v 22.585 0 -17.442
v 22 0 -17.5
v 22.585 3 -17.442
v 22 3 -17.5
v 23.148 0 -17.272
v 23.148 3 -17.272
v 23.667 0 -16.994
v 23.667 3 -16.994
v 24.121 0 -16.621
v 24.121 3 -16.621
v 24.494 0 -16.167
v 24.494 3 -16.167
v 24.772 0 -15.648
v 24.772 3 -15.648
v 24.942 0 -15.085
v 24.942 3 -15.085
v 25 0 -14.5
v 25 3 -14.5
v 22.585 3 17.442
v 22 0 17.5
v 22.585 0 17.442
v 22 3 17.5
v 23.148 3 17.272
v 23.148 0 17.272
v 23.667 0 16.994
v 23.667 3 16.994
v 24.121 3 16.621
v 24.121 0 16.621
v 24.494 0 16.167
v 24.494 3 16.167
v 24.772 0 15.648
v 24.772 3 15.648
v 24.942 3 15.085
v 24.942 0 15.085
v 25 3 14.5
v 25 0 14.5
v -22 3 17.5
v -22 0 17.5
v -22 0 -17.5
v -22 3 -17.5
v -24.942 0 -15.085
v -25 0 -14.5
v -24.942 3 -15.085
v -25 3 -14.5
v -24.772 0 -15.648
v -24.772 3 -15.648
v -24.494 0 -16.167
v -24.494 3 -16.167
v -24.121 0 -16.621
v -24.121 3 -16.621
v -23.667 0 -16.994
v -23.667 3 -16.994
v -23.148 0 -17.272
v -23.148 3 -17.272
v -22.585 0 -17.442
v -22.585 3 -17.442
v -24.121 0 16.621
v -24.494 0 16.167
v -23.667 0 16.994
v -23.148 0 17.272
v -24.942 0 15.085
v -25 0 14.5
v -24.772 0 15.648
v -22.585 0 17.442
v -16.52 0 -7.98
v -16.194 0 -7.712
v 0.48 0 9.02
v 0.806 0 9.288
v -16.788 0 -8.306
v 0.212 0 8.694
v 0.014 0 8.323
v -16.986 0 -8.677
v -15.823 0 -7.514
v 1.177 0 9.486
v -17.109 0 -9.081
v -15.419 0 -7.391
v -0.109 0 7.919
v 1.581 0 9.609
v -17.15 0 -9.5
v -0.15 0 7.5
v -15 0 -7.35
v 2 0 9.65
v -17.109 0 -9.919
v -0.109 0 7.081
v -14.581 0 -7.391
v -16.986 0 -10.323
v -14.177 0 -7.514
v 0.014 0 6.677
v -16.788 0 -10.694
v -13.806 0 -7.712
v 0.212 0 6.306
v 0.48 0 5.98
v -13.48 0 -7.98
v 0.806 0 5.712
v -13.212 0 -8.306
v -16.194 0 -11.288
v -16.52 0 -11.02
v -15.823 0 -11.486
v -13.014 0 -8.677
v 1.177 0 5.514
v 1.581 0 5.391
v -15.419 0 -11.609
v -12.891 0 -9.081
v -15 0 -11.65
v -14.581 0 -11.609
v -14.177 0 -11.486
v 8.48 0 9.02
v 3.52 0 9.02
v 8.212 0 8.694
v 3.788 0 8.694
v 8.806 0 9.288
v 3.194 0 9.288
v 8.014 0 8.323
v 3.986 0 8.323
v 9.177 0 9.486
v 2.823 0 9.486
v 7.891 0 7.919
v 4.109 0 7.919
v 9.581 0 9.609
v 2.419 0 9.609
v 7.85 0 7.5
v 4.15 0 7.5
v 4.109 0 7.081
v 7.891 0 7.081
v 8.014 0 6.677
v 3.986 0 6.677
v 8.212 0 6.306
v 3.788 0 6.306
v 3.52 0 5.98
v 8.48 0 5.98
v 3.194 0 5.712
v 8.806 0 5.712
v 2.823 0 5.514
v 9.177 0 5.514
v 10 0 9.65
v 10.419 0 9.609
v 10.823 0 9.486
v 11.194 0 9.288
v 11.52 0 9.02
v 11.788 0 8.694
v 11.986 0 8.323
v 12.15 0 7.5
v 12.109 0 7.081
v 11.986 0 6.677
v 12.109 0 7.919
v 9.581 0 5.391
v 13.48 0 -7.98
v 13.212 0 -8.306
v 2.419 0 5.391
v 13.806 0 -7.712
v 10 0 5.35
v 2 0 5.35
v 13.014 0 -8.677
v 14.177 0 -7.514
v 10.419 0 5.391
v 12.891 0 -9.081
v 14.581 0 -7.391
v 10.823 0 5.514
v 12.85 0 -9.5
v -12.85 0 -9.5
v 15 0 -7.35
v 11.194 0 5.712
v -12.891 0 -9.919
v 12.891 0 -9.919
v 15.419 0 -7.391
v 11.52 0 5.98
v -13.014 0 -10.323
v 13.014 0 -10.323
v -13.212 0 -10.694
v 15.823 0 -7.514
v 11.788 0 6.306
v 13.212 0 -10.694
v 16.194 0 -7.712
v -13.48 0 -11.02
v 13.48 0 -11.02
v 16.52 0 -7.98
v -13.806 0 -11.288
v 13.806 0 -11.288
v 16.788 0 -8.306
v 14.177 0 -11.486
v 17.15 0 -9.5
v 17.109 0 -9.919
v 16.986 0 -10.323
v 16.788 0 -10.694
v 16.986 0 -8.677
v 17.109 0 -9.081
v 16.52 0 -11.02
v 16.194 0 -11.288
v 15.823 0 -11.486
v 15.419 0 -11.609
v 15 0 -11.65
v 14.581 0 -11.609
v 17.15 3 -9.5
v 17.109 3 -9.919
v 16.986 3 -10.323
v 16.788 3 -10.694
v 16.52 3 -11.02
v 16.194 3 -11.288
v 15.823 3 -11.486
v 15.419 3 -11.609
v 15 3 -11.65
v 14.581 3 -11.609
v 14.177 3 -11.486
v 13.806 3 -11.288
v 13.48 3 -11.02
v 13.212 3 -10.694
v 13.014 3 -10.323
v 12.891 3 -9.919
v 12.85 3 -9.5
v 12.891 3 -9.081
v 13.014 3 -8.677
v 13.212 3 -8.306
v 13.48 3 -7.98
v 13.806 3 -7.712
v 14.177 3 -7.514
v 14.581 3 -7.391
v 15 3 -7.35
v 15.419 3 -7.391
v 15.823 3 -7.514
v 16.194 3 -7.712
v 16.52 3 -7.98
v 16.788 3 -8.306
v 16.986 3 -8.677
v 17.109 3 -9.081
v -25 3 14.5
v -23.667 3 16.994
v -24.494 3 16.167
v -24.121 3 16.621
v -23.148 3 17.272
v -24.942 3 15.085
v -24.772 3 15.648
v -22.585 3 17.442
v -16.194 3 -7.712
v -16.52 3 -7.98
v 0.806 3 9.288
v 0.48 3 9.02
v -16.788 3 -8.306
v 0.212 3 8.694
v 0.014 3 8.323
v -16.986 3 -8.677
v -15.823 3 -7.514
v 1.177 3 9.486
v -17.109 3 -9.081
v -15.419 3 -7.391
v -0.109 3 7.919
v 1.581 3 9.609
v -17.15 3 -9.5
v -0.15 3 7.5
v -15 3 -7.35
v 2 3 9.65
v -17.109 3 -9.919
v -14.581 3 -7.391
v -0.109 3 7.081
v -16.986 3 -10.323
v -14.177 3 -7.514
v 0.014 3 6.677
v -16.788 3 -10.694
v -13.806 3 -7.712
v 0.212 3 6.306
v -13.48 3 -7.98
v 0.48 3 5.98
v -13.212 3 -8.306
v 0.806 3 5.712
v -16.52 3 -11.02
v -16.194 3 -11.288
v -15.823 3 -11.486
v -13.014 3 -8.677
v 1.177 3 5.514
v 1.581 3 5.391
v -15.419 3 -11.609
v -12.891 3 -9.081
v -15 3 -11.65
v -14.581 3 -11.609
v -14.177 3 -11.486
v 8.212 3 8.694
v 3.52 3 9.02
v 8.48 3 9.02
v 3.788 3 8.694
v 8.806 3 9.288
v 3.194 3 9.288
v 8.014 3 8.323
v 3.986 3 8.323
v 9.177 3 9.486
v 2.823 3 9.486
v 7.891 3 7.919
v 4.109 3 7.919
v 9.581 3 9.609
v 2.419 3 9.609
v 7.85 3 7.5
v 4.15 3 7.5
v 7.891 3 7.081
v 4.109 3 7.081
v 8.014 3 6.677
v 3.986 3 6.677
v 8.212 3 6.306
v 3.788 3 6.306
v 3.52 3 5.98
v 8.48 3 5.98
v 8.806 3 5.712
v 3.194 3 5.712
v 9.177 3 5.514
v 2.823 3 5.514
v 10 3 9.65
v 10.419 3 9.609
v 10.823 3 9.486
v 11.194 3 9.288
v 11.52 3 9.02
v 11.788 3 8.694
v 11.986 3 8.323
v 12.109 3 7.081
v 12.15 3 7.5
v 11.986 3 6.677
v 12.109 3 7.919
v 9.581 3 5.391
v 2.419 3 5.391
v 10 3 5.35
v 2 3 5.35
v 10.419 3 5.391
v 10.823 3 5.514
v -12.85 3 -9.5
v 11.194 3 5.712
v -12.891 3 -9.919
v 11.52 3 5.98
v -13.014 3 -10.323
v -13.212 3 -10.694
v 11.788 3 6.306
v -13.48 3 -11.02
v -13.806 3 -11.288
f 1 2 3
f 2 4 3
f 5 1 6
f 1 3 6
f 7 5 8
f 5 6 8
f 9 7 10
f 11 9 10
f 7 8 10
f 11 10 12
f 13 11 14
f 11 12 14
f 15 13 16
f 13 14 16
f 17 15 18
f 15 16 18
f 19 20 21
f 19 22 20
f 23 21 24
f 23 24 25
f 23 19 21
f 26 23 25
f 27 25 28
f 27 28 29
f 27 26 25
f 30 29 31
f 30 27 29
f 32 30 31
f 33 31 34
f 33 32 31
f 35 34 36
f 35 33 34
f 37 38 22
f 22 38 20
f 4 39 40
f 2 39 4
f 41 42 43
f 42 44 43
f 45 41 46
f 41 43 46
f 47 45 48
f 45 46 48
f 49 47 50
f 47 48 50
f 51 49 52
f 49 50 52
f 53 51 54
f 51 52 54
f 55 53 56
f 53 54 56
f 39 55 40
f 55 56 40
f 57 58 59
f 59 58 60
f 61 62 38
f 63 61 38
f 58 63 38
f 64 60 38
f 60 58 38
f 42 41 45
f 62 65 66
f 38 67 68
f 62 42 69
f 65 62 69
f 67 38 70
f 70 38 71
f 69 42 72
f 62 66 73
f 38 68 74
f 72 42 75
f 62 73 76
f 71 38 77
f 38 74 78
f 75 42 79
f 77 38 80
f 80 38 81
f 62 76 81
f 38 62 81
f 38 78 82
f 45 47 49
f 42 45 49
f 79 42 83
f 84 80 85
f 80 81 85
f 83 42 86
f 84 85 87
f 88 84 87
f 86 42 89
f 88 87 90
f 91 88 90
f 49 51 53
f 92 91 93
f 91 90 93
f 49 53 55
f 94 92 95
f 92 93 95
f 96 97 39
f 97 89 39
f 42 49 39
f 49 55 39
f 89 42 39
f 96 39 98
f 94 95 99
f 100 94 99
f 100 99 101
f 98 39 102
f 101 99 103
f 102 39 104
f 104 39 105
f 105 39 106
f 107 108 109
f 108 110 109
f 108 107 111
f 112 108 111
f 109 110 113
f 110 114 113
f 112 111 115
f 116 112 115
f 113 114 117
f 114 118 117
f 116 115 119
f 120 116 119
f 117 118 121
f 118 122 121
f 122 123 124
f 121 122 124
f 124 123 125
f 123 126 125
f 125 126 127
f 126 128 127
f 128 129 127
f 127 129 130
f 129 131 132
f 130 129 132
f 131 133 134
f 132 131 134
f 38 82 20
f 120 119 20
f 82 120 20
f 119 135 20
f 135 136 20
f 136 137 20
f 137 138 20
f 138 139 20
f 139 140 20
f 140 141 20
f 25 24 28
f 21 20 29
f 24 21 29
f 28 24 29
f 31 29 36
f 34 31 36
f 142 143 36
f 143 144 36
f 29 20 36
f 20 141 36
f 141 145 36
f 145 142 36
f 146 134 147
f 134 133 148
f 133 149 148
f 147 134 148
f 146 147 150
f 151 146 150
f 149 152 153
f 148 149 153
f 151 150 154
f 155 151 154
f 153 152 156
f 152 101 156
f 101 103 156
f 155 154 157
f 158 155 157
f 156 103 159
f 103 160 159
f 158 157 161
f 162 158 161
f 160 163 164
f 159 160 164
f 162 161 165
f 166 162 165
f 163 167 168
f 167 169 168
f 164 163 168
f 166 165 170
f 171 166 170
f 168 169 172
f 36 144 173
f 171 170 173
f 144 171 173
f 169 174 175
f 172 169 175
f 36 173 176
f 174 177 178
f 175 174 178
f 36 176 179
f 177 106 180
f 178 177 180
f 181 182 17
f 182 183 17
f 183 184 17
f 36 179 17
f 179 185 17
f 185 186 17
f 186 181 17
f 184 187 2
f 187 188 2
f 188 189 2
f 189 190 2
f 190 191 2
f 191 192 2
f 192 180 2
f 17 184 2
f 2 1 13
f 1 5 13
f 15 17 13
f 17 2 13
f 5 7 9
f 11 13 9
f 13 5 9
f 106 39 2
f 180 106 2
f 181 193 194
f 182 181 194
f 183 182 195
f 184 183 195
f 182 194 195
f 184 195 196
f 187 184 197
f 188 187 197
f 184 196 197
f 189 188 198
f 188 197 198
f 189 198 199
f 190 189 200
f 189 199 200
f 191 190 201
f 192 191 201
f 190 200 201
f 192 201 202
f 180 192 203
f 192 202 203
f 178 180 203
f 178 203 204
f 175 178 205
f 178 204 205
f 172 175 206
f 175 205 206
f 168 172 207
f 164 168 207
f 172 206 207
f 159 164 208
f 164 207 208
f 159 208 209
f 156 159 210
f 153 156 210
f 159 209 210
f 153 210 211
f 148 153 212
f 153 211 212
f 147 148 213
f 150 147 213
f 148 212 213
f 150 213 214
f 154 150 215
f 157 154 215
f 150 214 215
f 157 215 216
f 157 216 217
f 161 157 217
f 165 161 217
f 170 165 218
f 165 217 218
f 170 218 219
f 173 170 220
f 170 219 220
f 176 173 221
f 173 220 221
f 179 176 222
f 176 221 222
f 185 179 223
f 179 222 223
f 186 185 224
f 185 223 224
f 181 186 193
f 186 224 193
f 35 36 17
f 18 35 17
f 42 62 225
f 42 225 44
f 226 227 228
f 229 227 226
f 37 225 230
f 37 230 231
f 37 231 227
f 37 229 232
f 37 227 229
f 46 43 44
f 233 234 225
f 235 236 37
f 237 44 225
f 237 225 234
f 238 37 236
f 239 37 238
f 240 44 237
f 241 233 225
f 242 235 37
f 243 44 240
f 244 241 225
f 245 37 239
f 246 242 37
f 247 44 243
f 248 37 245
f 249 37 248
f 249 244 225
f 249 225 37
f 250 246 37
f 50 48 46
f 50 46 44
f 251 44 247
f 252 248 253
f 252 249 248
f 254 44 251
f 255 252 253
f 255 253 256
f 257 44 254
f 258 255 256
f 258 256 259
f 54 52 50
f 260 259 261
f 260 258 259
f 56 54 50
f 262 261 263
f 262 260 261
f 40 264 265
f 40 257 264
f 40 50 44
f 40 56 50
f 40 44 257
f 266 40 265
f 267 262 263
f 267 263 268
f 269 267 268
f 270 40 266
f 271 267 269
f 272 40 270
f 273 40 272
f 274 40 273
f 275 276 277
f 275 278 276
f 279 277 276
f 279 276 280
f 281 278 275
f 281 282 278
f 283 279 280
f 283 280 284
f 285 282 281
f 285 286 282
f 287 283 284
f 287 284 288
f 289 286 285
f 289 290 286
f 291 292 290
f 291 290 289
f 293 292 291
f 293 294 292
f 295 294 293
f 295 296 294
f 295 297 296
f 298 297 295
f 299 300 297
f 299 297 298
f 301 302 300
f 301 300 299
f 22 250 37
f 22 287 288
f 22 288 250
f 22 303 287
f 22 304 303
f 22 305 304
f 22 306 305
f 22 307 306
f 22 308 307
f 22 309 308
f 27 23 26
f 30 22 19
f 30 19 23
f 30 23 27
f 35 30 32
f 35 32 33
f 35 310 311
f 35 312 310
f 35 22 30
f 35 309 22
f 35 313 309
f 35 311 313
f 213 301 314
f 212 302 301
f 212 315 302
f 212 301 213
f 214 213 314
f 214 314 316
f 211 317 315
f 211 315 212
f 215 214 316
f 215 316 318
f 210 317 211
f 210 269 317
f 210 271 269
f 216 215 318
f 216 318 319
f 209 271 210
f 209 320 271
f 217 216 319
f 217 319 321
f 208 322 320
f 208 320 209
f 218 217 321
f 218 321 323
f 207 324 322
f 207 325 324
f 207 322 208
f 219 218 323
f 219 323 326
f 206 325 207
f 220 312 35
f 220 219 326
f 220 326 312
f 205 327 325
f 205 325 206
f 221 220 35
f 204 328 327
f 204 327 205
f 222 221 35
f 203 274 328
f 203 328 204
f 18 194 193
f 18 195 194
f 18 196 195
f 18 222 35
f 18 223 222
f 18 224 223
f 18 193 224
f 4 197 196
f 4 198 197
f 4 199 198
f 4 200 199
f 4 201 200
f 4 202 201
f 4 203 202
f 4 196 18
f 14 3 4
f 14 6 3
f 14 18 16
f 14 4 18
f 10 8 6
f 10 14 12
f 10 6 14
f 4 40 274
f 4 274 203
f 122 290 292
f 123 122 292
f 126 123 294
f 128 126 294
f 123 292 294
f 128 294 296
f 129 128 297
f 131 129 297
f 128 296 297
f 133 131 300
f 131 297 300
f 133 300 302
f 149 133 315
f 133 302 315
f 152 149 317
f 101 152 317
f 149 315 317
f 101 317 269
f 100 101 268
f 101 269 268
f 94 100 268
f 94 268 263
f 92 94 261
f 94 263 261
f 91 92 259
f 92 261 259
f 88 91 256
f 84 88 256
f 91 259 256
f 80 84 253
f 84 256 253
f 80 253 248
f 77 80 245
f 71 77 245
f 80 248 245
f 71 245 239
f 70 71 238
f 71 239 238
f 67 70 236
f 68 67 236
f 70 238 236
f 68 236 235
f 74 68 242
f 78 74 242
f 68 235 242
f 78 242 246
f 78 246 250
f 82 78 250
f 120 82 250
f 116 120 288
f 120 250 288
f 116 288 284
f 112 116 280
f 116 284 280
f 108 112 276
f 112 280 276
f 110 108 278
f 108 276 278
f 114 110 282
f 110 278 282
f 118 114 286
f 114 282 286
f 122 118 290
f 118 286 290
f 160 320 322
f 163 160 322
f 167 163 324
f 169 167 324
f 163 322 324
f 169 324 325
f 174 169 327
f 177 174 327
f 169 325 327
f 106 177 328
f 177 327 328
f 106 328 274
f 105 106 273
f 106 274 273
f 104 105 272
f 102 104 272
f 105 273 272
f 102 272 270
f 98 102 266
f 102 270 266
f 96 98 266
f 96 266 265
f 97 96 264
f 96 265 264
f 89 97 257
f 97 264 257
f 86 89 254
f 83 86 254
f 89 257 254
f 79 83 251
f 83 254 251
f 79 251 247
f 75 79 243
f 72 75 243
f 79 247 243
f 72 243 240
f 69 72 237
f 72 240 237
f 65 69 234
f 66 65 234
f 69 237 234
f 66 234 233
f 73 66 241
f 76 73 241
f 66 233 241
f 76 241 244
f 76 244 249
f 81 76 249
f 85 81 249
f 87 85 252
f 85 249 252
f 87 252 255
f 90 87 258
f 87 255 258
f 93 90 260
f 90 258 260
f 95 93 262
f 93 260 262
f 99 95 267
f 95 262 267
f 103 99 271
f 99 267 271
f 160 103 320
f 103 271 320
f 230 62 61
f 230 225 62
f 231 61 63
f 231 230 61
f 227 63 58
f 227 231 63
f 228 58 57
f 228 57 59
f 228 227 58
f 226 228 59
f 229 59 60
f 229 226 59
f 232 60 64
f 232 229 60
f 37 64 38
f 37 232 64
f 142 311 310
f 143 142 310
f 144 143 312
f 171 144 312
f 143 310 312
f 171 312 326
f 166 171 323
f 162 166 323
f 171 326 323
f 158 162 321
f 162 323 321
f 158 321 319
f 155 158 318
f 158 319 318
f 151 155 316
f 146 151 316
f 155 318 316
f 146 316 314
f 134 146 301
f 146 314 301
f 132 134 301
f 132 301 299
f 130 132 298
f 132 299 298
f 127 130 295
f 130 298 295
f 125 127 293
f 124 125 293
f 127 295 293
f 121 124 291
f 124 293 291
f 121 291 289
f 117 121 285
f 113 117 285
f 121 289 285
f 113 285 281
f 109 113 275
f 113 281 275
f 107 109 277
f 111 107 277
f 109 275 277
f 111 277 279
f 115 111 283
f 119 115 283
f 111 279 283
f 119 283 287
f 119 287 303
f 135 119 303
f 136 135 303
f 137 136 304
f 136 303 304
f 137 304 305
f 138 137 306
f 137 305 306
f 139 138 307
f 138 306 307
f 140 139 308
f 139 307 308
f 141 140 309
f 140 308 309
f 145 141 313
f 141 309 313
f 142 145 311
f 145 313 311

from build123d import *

# Parameters (mm, degrees)
SKETCH_1_W          = 50
SKETCH_1_H          = 35
EXTRUDE_1_DEPTH     = 3
SKETCH_2_R          = 2.15
CUT_EXTRUDE_1_DEPTH = 3
SKETCH_3_R          = 2.15
CUT_EXTRUDE_2_DEPTH = 3
FILLET_1_R          = 3


with BuildPart() as part:
    # 草图1 → 凸台-拉伸1 (new body)
    with BuildSketch(Plane(origin=(0, 0, 0), x_dir=(1, 0, 0), z_dir=(0, 1, 0))):
        Rectangle(SKETCH_1_W, SKETCH_1_H)
    extrude(amount=EXTRUDE_1_DEPTH)

    # 草图2 → 切除-拉伸1 (cut)
    with BuildSketch(Plane(origin=(0, 3, 0), x_dir=(1, 0, 0), z_dir=(0, 1, 0))):
        with Locations((-15, 9.5)):
            Circle(SKETCH_2_R)
        with Locations((15, 9.5)):
            Circle(SKETCH_2_R)
    extrude(amount=-CUT_EXTRUDE_1_DEPTH, mode=Mode.SUBTRACT)

    # 草图3 → 切除-拉伸2 (cut)
    with BuildSketch(Plane(origin=(0, 3, 0), x_dir=(1, 0, 0), z_dir=(0, 1, 0))):
        with Locations((2, -7.5)):
            Circle(SKETCH_3_R)
        with Locations((10, -7.5)):
            Circle(SKETCH_3_R)
    extrude(amount=-CUT_EXTRUDE_2_DEPTH, mode=Mode.SUBTRACT)

    # 圆角1
    fillet_1_edges = [part.edges().sort_by_distance(p)[0] for p in [
        (25, 1.5, 17.5),
        (-25, 1.5, 17.5),
        (-25, 1.5, -17.5),
        (25, 1.5, -17.5),
    ]]
    fillet(fillet_1_edges, radius=FILLET_1_R)


solid = part.part
